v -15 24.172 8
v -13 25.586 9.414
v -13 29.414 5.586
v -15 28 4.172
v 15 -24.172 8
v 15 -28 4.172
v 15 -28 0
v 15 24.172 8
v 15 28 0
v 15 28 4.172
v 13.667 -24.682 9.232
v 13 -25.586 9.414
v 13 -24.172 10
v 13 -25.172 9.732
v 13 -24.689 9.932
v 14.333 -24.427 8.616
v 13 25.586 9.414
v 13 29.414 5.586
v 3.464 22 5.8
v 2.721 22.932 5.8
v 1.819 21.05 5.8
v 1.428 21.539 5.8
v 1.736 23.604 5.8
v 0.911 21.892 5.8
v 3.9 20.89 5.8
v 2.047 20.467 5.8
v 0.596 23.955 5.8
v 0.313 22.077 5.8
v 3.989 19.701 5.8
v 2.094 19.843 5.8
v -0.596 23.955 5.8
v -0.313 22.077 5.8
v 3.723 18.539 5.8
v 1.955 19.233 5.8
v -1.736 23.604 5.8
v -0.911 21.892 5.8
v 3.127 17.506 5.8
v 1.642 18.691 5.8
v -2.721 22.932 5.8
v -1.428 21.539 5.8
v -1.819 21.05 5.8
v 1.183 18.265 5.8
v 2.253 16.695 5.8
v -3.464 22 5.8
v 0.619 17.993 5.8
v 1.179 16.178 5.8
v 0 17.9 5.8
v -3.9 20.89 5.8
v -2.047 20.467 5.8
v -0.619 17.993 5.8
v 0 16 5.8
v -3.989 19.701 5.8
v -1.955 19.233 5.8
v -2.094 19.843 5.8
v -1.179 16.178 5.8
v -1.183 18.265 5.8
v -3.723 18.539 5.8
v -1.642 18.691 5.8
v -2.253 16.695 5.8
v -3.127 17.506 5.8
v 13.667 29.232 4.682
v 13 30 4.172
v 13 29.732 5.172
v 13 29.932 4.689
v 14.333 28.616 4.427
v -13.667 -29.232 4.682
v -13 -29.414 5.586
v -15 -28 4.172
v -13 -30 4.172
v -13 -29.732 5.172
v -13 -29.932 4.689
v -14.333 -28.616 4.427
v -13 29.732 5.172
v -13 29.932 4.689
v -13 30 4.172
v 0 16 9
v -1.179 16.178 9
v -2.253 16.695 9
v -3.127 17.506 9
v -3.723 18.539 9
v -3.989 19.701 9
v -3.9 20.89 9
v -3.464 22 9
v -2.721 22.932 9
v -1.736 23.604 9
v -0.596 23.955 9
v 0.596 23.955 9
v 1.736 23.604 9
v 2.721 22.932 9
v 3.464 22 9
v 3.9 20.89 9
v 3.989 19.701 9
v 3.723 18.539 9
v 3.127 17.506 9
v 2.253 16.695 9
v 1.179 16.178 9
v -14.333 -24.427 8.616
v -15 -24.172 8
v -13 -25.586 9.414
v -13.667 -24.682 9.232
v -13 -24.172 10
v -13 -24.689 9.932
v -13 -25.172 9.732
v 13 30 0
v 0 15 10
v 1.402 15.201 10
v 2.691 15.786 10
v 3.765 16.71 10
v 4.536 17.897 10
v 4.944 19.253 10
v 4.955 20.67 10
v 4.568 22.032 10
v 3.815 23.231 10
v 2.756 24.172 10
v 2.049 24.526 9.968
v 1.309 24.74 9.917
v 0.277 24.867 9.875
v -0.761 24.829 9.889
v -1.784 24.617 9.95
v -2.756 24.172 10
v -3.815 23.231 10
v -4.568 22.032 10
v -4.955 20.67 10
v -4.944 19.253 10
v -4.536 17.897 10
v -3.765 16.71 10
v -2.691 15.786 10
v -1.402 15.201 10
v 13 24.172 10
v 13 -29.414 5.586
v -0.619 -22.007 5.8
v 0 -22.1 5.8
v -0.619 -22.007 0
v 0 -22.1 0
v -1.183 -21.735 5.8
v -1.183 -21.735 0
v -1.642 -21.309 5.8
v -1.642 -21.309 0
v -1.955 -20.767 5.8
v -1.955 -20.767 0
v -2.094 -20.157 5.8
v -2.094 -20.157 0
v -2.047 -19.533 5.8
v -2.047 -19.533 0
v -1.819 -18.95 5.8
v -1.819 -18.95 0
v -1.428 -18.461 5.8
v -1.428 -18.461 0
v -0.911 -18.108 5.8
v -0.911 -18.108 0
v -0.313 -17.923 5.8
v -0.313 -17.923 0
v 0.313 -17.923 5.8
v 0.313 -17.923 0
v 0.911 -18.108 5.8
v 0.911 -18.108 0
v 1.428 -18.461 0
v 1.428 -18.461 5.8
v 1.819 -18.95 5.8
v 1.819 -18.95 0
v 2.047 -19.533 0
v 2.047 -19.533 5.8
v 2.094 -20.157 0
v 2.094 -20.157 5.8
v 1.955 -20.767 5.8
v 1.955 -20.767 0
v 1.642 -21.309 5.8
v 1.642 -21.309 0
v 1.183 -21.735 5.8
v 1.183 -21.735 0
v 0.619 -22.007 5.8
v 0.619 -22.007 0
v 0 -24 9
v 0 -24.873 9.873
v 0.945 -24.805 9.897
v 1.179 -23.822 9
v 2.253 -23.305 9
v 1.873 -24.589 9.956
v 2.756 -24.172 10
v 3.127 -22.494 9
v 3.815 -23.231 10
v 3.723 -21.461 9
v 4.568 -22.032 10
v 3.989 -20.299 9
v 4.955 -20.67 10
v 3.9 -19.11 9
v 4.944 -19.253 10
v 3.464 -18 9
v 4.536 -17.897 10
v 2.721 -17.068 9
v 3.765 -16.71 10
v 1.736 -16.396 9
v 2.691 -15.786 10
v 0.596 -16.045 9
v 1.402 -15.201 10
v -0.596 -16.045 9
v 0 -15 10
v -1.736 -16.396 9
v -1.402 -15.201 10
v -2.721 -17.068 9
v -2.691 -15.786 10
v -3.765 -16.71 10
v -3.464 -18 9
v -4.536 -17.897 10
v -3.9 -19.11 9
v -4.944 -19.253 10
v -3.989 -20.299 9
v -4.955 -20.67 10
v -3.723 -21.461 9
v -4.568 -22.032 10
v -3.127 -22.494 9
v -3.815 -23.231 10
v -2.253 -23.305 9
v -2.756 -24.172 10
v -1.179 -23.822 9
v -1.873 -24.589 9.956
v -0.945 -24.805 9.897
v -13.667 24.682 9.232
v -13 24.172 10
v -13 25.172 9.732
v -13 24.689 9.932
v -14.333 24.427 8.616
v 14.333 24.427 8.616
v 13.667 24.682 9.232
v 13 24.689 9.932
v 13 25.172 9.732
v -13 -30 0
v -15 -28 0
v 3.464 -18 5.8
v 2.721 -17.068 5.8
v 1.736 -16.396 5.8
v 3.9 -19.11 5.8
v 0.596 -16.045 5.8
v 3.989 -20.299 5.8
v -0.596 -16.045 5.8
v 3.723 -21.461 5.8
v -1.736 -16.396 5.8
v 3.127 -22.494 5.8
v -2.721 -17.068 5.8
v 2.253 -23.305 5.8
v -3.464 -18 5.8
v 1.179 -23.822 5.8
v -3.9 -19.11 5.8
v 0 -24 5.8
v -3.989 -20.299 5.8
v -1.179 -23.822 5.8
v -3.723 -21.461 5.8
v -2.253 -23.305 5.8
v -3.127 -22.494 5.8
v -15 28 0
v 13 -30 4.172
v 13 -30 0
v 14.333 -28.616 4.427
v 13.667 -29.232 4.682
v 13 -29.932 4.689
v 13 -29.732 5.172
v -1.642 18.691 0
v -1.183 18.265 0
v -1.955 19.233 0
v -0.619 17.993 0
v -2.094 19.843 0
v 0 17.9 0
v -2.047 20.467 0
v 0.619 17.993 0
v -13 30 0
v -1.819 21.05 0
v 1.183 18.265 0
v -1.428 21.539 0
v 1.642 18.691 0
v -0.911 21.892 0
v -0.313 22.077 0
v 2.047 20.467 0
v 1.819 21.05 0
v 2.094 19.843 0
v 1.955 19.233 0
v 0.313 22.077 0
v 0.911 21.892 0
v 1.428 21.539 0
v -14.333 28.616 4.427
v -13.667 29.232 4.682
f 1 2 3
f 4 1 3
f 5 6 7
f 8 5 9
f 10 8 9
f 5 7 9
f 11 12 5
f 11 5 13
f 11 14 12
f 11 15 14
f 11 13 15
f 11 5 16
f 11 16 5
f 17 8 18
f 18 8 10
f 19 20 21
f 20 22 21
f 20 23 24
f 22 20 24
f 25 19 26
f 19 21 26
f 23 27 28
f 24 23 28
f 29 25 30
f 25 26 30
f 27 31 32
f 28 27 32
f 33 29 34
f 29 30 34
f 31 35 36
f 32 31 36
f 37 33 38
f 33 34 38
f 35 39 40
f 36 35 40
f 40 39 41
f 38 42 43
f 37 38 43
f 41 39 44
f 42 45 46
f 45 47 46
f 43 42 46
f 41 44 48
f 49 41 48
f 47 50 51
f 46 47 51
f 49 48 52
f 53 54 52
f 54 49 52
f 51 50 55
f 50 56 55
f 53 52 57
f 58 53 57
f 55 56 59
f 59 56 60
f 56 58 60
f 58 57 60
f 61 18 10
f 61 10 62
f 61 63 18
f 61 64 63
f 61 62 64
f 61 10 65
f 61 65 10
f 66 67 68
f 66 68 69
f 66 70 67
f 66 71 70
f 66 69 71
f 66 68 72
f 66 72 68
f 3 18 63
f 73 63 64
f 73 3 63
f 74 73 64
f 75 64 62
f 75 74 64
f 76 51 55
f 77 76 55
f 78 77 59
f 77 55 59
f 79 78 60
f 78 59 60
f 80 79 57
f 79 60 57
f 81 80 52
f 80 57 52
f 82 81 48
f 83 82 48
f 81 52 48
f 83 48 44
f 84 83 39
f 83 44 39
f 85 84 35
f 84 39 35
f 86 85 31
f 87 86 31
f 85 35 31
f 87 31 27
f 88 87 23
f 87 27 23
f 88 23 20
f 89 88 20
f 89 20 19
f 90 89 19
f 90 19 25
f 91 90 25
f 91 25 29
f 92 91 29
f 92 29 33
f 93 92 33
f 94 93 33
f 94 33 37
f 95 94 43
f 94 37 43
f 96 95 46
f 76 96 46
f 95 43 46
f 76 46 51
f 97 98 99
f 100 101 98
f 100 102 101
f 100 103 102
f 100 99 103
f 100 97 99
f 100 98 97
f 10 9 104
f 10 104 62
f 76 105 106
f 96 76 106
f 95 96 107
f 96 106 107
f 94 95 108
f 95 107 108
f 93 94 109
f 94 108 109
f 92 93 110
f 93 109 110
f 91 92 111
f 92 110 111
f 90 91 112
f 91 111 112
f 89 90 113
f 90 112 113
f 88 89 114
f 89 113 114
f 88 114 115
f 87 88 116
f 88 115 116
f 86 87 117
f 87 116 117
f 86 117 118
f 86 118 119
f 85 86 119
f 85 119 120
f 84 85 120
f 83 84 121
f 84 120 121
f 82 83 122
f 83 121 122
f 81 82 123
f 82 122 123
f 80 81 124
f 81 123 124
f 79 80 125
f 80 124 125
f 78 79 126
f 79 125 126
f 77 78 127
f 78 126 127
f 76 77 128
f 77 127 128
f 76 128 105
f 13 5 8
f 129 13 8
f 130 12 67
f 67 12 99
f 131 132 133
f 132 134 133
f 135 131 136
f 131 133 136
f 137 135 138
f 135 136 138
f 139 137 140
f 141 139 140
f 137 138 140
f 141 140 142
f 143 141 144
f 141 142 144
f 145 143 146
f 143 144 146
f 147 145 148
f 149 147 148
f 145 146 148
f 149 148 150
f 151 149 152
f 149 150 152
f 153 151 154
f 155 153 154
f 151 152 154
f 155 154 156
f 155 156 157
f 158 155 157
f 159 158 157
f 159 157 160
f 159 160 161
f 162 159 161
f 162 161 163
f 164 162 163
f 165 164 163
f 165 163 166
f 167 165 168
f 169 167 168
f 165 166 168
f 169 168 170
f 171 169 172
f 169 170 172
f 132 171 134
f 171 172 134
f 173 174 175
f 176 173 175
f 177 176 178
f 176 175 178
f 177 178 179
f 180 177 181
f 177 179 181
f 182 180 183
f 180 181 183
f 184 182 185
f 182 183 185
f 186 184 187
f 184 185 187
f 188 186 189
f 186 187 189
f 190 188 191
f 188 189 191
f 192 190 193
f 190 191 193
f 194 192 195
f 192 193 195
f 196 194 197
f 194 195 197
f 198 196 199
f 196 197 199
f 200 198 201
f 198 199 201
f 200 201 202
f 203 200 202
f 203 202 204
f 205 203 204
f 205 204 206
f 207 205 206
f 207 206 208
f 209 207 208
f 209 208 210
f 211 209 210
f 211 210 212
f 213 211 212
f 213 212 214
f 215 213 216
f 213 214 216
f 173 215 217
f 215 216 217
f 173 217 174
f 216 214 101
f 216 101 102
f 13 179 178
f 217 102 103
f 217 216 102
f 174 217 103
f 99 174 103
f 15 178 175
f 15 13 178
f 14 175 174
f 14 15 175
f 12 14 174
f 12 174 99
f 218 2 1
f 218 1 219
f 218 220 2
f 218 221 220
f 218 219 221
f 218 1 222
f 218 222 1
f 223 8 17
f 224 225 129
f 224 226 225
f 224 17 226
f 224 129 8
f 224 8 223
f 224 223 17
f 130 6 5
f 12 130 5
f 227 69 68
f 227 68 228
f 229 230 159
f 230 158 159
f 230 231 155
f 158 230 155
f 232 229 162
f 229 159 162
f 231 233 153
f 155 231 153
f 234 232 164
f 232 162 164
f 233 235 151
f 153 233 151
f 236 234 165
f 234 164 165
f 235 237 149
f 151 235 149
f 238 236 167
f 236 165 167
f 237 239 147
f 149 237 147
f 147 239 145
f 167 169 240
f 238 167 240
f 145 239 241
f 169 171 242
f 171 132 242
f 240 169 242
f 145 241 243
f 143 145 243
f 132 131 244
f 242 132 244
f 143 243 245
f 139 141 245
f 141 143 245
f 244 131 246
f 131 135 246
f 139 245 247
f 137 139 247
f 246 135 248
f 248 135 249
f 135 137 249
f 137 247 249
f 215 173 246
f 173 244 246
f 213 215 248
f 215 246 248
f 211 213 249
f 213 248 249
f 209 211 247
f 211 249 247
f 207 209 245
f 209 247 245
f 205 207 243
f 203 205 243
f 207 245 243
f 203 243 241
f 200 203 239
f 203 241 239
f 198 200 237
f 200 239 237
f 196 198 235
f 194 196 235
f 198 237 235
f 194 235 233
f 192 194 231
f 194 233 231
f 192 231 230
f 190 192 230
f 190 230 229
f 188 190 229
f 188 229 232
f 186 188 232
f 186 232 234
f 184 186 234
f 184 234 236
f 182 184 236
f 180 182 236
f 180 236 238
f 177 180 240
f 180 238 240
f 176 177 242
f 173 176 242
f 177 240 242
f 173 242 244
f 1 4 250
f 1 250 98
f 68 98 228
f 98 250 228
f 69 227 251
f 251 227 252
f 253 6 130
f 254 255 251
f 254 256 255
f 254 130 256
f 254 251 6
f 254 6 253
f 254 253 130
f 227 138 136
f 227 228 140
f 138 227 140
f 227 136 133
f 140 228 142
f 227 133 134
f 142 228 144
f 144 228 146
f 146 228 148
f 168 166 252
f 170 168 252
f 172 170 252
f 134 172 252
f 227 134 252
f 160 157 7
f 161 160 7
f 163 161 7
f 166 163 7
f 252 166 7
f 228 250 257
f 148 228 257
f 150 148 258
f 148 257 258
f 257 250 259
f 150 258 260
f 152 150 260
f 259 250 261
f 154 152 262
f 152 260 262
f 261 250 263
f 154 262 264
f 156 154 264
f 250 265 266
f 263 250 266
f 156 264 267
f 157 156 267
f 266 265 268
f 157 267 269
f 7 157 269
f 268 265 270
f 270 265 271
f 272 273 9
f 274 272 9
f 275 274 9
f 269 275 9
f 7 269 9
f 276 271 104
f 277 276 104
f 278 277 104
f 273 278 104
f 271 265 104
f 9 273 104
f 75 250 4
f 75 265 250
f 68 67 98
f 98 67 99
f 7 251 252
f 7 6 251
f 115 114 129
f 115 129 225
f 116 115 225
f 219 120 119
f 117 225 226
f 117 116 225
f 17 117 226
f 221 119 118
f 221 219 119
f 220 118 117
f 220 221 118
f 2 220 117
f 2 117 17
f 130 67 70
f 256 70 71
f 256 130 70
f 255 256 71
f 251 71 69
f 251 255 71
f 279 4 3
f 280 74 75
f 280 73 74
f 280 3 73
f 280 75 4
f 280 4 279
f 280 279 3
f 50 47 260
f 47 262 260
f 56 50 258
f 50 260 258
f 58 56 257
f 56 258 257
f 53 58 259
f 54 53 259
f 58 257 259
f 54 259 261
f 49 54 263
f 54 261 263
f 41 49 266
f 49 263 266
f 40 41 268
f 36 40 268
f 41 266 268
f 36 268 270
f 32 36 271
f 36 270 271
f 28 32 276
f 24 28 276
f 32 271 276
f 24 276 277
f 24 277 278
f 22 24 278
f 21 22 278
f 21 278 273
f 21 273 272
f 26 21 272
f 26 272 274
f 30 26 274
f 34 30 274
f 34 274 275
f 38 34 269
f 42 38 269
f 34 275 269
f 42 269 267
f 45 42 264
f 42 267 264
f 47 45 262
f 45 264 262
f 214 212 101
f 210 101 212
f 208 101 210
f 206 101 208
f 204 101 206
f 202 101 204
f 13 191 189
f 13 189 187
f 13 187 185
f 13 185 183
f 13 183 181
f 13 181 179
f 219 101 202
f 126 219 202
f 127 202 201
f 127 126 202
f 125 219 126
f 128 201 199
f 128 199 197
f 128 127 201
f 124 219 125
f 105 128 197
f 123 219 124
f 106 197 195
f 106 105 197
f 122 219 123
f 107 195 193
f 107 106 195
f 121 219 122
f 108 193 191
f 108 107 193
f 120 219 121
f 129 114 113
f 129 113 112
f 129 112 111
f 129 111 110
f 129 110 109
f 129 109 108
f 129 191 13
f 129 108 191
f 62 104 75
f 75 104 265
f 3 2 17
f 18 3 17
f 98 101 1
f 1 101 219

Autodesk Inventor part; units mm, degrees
ref_plane "YZ Plane" through (0, 0, 0) normal (1, 0, 0) x (0, 1, 0)
ref_plane "XZ Plane" through (0, 0, 0) normal (0, 1, 0) x (-1, 0, 0)
ref_plane "XY Plane" through (0, 0, 0) normal (0, 0, 1) x (1, 0, 0)
sketch "スケッチ1" plane through (0, 0, 0) normal (0, 0, 1) x (1, 0, 0)
  line L0 (-15, -30) -> (15, -30)
  line L1 (15, -30) -> (15, 30)
  line L2 (15, 30) -> (-15, 30)
  line L3 (-15, 30) -> (-15, -30)
  line L4 (-15, -30) -> (15, 30) construction
  line L5 (15, -30) -> (-15, 30) construction
  point P0 (0, 0)
  dimension "d0" = 30
  dimension "d1" = 60
extrude "押し出し1" add sketch "スケッチ1" along normal blind 10
chamfer "面取り1" distance 5 angle 45 2 edges at (0, 30, 10) (0, -30, 10)
fillet "フィレット1" radius 2 4 edges at (0, 30, 5) (0, 25, 10) (0, -25, 10) (0, -30, 5)
chamfer "面取り2" distance 2 angle 45 18 edges at (15, 0, 10) (15, 24.9369, 9.8478) (15, 27.5, 7.5) (15, 29.8478, 4.9369) (15, 30, 2.0858) (15, -24.9369, 9.8478) (15, -27.5, 7.5) (15, -29.8478, 4.9369) (15, -30, 2.0858) (-15, 0, 10) (-15, -24.9369, 9.8478) (-15, -27.5, 7.5) (-15, -29.8478, 4.9369) (-15, -30, 2.0858) (-15, 24.9369, 9.8478) (-15, 27.5, 7.5) (-15, 29.8478, 4.9369) (-15, 30, 2.0858)
sketch "スケッチ2" plane through (0, 0, 10) normal (0, 0, 1) x (1, 0, 0)
  line L0 (-13, -24.1716) -> (-13, 24.1716) projected
  line L1 (13, -24.1716) -> (-13, -24.1716) projected
  line L2 (13, 24.1716) -> (13, -24.1716) projected
  line L3 (-13, 24.1716) -> (13, 24.1716) projected
  point P0 (0, 0)
  point P1 (0, 20)
  point P2 (0, -20)
  dimension "d11" = 40
  dimension "d12" = 20
hole "穴1" at (0, 20, 10) at (0, -20, 10) direction (0, 0, -1) diameter 4.2 depth 21.5 counterbore diameter 8 counterbore depth 4.2
chamfer "面取り3" distance 1 angle 45 2 edges at (0, 24, 10) (0, -16, 10)
properties part number "Flame_Cover"
